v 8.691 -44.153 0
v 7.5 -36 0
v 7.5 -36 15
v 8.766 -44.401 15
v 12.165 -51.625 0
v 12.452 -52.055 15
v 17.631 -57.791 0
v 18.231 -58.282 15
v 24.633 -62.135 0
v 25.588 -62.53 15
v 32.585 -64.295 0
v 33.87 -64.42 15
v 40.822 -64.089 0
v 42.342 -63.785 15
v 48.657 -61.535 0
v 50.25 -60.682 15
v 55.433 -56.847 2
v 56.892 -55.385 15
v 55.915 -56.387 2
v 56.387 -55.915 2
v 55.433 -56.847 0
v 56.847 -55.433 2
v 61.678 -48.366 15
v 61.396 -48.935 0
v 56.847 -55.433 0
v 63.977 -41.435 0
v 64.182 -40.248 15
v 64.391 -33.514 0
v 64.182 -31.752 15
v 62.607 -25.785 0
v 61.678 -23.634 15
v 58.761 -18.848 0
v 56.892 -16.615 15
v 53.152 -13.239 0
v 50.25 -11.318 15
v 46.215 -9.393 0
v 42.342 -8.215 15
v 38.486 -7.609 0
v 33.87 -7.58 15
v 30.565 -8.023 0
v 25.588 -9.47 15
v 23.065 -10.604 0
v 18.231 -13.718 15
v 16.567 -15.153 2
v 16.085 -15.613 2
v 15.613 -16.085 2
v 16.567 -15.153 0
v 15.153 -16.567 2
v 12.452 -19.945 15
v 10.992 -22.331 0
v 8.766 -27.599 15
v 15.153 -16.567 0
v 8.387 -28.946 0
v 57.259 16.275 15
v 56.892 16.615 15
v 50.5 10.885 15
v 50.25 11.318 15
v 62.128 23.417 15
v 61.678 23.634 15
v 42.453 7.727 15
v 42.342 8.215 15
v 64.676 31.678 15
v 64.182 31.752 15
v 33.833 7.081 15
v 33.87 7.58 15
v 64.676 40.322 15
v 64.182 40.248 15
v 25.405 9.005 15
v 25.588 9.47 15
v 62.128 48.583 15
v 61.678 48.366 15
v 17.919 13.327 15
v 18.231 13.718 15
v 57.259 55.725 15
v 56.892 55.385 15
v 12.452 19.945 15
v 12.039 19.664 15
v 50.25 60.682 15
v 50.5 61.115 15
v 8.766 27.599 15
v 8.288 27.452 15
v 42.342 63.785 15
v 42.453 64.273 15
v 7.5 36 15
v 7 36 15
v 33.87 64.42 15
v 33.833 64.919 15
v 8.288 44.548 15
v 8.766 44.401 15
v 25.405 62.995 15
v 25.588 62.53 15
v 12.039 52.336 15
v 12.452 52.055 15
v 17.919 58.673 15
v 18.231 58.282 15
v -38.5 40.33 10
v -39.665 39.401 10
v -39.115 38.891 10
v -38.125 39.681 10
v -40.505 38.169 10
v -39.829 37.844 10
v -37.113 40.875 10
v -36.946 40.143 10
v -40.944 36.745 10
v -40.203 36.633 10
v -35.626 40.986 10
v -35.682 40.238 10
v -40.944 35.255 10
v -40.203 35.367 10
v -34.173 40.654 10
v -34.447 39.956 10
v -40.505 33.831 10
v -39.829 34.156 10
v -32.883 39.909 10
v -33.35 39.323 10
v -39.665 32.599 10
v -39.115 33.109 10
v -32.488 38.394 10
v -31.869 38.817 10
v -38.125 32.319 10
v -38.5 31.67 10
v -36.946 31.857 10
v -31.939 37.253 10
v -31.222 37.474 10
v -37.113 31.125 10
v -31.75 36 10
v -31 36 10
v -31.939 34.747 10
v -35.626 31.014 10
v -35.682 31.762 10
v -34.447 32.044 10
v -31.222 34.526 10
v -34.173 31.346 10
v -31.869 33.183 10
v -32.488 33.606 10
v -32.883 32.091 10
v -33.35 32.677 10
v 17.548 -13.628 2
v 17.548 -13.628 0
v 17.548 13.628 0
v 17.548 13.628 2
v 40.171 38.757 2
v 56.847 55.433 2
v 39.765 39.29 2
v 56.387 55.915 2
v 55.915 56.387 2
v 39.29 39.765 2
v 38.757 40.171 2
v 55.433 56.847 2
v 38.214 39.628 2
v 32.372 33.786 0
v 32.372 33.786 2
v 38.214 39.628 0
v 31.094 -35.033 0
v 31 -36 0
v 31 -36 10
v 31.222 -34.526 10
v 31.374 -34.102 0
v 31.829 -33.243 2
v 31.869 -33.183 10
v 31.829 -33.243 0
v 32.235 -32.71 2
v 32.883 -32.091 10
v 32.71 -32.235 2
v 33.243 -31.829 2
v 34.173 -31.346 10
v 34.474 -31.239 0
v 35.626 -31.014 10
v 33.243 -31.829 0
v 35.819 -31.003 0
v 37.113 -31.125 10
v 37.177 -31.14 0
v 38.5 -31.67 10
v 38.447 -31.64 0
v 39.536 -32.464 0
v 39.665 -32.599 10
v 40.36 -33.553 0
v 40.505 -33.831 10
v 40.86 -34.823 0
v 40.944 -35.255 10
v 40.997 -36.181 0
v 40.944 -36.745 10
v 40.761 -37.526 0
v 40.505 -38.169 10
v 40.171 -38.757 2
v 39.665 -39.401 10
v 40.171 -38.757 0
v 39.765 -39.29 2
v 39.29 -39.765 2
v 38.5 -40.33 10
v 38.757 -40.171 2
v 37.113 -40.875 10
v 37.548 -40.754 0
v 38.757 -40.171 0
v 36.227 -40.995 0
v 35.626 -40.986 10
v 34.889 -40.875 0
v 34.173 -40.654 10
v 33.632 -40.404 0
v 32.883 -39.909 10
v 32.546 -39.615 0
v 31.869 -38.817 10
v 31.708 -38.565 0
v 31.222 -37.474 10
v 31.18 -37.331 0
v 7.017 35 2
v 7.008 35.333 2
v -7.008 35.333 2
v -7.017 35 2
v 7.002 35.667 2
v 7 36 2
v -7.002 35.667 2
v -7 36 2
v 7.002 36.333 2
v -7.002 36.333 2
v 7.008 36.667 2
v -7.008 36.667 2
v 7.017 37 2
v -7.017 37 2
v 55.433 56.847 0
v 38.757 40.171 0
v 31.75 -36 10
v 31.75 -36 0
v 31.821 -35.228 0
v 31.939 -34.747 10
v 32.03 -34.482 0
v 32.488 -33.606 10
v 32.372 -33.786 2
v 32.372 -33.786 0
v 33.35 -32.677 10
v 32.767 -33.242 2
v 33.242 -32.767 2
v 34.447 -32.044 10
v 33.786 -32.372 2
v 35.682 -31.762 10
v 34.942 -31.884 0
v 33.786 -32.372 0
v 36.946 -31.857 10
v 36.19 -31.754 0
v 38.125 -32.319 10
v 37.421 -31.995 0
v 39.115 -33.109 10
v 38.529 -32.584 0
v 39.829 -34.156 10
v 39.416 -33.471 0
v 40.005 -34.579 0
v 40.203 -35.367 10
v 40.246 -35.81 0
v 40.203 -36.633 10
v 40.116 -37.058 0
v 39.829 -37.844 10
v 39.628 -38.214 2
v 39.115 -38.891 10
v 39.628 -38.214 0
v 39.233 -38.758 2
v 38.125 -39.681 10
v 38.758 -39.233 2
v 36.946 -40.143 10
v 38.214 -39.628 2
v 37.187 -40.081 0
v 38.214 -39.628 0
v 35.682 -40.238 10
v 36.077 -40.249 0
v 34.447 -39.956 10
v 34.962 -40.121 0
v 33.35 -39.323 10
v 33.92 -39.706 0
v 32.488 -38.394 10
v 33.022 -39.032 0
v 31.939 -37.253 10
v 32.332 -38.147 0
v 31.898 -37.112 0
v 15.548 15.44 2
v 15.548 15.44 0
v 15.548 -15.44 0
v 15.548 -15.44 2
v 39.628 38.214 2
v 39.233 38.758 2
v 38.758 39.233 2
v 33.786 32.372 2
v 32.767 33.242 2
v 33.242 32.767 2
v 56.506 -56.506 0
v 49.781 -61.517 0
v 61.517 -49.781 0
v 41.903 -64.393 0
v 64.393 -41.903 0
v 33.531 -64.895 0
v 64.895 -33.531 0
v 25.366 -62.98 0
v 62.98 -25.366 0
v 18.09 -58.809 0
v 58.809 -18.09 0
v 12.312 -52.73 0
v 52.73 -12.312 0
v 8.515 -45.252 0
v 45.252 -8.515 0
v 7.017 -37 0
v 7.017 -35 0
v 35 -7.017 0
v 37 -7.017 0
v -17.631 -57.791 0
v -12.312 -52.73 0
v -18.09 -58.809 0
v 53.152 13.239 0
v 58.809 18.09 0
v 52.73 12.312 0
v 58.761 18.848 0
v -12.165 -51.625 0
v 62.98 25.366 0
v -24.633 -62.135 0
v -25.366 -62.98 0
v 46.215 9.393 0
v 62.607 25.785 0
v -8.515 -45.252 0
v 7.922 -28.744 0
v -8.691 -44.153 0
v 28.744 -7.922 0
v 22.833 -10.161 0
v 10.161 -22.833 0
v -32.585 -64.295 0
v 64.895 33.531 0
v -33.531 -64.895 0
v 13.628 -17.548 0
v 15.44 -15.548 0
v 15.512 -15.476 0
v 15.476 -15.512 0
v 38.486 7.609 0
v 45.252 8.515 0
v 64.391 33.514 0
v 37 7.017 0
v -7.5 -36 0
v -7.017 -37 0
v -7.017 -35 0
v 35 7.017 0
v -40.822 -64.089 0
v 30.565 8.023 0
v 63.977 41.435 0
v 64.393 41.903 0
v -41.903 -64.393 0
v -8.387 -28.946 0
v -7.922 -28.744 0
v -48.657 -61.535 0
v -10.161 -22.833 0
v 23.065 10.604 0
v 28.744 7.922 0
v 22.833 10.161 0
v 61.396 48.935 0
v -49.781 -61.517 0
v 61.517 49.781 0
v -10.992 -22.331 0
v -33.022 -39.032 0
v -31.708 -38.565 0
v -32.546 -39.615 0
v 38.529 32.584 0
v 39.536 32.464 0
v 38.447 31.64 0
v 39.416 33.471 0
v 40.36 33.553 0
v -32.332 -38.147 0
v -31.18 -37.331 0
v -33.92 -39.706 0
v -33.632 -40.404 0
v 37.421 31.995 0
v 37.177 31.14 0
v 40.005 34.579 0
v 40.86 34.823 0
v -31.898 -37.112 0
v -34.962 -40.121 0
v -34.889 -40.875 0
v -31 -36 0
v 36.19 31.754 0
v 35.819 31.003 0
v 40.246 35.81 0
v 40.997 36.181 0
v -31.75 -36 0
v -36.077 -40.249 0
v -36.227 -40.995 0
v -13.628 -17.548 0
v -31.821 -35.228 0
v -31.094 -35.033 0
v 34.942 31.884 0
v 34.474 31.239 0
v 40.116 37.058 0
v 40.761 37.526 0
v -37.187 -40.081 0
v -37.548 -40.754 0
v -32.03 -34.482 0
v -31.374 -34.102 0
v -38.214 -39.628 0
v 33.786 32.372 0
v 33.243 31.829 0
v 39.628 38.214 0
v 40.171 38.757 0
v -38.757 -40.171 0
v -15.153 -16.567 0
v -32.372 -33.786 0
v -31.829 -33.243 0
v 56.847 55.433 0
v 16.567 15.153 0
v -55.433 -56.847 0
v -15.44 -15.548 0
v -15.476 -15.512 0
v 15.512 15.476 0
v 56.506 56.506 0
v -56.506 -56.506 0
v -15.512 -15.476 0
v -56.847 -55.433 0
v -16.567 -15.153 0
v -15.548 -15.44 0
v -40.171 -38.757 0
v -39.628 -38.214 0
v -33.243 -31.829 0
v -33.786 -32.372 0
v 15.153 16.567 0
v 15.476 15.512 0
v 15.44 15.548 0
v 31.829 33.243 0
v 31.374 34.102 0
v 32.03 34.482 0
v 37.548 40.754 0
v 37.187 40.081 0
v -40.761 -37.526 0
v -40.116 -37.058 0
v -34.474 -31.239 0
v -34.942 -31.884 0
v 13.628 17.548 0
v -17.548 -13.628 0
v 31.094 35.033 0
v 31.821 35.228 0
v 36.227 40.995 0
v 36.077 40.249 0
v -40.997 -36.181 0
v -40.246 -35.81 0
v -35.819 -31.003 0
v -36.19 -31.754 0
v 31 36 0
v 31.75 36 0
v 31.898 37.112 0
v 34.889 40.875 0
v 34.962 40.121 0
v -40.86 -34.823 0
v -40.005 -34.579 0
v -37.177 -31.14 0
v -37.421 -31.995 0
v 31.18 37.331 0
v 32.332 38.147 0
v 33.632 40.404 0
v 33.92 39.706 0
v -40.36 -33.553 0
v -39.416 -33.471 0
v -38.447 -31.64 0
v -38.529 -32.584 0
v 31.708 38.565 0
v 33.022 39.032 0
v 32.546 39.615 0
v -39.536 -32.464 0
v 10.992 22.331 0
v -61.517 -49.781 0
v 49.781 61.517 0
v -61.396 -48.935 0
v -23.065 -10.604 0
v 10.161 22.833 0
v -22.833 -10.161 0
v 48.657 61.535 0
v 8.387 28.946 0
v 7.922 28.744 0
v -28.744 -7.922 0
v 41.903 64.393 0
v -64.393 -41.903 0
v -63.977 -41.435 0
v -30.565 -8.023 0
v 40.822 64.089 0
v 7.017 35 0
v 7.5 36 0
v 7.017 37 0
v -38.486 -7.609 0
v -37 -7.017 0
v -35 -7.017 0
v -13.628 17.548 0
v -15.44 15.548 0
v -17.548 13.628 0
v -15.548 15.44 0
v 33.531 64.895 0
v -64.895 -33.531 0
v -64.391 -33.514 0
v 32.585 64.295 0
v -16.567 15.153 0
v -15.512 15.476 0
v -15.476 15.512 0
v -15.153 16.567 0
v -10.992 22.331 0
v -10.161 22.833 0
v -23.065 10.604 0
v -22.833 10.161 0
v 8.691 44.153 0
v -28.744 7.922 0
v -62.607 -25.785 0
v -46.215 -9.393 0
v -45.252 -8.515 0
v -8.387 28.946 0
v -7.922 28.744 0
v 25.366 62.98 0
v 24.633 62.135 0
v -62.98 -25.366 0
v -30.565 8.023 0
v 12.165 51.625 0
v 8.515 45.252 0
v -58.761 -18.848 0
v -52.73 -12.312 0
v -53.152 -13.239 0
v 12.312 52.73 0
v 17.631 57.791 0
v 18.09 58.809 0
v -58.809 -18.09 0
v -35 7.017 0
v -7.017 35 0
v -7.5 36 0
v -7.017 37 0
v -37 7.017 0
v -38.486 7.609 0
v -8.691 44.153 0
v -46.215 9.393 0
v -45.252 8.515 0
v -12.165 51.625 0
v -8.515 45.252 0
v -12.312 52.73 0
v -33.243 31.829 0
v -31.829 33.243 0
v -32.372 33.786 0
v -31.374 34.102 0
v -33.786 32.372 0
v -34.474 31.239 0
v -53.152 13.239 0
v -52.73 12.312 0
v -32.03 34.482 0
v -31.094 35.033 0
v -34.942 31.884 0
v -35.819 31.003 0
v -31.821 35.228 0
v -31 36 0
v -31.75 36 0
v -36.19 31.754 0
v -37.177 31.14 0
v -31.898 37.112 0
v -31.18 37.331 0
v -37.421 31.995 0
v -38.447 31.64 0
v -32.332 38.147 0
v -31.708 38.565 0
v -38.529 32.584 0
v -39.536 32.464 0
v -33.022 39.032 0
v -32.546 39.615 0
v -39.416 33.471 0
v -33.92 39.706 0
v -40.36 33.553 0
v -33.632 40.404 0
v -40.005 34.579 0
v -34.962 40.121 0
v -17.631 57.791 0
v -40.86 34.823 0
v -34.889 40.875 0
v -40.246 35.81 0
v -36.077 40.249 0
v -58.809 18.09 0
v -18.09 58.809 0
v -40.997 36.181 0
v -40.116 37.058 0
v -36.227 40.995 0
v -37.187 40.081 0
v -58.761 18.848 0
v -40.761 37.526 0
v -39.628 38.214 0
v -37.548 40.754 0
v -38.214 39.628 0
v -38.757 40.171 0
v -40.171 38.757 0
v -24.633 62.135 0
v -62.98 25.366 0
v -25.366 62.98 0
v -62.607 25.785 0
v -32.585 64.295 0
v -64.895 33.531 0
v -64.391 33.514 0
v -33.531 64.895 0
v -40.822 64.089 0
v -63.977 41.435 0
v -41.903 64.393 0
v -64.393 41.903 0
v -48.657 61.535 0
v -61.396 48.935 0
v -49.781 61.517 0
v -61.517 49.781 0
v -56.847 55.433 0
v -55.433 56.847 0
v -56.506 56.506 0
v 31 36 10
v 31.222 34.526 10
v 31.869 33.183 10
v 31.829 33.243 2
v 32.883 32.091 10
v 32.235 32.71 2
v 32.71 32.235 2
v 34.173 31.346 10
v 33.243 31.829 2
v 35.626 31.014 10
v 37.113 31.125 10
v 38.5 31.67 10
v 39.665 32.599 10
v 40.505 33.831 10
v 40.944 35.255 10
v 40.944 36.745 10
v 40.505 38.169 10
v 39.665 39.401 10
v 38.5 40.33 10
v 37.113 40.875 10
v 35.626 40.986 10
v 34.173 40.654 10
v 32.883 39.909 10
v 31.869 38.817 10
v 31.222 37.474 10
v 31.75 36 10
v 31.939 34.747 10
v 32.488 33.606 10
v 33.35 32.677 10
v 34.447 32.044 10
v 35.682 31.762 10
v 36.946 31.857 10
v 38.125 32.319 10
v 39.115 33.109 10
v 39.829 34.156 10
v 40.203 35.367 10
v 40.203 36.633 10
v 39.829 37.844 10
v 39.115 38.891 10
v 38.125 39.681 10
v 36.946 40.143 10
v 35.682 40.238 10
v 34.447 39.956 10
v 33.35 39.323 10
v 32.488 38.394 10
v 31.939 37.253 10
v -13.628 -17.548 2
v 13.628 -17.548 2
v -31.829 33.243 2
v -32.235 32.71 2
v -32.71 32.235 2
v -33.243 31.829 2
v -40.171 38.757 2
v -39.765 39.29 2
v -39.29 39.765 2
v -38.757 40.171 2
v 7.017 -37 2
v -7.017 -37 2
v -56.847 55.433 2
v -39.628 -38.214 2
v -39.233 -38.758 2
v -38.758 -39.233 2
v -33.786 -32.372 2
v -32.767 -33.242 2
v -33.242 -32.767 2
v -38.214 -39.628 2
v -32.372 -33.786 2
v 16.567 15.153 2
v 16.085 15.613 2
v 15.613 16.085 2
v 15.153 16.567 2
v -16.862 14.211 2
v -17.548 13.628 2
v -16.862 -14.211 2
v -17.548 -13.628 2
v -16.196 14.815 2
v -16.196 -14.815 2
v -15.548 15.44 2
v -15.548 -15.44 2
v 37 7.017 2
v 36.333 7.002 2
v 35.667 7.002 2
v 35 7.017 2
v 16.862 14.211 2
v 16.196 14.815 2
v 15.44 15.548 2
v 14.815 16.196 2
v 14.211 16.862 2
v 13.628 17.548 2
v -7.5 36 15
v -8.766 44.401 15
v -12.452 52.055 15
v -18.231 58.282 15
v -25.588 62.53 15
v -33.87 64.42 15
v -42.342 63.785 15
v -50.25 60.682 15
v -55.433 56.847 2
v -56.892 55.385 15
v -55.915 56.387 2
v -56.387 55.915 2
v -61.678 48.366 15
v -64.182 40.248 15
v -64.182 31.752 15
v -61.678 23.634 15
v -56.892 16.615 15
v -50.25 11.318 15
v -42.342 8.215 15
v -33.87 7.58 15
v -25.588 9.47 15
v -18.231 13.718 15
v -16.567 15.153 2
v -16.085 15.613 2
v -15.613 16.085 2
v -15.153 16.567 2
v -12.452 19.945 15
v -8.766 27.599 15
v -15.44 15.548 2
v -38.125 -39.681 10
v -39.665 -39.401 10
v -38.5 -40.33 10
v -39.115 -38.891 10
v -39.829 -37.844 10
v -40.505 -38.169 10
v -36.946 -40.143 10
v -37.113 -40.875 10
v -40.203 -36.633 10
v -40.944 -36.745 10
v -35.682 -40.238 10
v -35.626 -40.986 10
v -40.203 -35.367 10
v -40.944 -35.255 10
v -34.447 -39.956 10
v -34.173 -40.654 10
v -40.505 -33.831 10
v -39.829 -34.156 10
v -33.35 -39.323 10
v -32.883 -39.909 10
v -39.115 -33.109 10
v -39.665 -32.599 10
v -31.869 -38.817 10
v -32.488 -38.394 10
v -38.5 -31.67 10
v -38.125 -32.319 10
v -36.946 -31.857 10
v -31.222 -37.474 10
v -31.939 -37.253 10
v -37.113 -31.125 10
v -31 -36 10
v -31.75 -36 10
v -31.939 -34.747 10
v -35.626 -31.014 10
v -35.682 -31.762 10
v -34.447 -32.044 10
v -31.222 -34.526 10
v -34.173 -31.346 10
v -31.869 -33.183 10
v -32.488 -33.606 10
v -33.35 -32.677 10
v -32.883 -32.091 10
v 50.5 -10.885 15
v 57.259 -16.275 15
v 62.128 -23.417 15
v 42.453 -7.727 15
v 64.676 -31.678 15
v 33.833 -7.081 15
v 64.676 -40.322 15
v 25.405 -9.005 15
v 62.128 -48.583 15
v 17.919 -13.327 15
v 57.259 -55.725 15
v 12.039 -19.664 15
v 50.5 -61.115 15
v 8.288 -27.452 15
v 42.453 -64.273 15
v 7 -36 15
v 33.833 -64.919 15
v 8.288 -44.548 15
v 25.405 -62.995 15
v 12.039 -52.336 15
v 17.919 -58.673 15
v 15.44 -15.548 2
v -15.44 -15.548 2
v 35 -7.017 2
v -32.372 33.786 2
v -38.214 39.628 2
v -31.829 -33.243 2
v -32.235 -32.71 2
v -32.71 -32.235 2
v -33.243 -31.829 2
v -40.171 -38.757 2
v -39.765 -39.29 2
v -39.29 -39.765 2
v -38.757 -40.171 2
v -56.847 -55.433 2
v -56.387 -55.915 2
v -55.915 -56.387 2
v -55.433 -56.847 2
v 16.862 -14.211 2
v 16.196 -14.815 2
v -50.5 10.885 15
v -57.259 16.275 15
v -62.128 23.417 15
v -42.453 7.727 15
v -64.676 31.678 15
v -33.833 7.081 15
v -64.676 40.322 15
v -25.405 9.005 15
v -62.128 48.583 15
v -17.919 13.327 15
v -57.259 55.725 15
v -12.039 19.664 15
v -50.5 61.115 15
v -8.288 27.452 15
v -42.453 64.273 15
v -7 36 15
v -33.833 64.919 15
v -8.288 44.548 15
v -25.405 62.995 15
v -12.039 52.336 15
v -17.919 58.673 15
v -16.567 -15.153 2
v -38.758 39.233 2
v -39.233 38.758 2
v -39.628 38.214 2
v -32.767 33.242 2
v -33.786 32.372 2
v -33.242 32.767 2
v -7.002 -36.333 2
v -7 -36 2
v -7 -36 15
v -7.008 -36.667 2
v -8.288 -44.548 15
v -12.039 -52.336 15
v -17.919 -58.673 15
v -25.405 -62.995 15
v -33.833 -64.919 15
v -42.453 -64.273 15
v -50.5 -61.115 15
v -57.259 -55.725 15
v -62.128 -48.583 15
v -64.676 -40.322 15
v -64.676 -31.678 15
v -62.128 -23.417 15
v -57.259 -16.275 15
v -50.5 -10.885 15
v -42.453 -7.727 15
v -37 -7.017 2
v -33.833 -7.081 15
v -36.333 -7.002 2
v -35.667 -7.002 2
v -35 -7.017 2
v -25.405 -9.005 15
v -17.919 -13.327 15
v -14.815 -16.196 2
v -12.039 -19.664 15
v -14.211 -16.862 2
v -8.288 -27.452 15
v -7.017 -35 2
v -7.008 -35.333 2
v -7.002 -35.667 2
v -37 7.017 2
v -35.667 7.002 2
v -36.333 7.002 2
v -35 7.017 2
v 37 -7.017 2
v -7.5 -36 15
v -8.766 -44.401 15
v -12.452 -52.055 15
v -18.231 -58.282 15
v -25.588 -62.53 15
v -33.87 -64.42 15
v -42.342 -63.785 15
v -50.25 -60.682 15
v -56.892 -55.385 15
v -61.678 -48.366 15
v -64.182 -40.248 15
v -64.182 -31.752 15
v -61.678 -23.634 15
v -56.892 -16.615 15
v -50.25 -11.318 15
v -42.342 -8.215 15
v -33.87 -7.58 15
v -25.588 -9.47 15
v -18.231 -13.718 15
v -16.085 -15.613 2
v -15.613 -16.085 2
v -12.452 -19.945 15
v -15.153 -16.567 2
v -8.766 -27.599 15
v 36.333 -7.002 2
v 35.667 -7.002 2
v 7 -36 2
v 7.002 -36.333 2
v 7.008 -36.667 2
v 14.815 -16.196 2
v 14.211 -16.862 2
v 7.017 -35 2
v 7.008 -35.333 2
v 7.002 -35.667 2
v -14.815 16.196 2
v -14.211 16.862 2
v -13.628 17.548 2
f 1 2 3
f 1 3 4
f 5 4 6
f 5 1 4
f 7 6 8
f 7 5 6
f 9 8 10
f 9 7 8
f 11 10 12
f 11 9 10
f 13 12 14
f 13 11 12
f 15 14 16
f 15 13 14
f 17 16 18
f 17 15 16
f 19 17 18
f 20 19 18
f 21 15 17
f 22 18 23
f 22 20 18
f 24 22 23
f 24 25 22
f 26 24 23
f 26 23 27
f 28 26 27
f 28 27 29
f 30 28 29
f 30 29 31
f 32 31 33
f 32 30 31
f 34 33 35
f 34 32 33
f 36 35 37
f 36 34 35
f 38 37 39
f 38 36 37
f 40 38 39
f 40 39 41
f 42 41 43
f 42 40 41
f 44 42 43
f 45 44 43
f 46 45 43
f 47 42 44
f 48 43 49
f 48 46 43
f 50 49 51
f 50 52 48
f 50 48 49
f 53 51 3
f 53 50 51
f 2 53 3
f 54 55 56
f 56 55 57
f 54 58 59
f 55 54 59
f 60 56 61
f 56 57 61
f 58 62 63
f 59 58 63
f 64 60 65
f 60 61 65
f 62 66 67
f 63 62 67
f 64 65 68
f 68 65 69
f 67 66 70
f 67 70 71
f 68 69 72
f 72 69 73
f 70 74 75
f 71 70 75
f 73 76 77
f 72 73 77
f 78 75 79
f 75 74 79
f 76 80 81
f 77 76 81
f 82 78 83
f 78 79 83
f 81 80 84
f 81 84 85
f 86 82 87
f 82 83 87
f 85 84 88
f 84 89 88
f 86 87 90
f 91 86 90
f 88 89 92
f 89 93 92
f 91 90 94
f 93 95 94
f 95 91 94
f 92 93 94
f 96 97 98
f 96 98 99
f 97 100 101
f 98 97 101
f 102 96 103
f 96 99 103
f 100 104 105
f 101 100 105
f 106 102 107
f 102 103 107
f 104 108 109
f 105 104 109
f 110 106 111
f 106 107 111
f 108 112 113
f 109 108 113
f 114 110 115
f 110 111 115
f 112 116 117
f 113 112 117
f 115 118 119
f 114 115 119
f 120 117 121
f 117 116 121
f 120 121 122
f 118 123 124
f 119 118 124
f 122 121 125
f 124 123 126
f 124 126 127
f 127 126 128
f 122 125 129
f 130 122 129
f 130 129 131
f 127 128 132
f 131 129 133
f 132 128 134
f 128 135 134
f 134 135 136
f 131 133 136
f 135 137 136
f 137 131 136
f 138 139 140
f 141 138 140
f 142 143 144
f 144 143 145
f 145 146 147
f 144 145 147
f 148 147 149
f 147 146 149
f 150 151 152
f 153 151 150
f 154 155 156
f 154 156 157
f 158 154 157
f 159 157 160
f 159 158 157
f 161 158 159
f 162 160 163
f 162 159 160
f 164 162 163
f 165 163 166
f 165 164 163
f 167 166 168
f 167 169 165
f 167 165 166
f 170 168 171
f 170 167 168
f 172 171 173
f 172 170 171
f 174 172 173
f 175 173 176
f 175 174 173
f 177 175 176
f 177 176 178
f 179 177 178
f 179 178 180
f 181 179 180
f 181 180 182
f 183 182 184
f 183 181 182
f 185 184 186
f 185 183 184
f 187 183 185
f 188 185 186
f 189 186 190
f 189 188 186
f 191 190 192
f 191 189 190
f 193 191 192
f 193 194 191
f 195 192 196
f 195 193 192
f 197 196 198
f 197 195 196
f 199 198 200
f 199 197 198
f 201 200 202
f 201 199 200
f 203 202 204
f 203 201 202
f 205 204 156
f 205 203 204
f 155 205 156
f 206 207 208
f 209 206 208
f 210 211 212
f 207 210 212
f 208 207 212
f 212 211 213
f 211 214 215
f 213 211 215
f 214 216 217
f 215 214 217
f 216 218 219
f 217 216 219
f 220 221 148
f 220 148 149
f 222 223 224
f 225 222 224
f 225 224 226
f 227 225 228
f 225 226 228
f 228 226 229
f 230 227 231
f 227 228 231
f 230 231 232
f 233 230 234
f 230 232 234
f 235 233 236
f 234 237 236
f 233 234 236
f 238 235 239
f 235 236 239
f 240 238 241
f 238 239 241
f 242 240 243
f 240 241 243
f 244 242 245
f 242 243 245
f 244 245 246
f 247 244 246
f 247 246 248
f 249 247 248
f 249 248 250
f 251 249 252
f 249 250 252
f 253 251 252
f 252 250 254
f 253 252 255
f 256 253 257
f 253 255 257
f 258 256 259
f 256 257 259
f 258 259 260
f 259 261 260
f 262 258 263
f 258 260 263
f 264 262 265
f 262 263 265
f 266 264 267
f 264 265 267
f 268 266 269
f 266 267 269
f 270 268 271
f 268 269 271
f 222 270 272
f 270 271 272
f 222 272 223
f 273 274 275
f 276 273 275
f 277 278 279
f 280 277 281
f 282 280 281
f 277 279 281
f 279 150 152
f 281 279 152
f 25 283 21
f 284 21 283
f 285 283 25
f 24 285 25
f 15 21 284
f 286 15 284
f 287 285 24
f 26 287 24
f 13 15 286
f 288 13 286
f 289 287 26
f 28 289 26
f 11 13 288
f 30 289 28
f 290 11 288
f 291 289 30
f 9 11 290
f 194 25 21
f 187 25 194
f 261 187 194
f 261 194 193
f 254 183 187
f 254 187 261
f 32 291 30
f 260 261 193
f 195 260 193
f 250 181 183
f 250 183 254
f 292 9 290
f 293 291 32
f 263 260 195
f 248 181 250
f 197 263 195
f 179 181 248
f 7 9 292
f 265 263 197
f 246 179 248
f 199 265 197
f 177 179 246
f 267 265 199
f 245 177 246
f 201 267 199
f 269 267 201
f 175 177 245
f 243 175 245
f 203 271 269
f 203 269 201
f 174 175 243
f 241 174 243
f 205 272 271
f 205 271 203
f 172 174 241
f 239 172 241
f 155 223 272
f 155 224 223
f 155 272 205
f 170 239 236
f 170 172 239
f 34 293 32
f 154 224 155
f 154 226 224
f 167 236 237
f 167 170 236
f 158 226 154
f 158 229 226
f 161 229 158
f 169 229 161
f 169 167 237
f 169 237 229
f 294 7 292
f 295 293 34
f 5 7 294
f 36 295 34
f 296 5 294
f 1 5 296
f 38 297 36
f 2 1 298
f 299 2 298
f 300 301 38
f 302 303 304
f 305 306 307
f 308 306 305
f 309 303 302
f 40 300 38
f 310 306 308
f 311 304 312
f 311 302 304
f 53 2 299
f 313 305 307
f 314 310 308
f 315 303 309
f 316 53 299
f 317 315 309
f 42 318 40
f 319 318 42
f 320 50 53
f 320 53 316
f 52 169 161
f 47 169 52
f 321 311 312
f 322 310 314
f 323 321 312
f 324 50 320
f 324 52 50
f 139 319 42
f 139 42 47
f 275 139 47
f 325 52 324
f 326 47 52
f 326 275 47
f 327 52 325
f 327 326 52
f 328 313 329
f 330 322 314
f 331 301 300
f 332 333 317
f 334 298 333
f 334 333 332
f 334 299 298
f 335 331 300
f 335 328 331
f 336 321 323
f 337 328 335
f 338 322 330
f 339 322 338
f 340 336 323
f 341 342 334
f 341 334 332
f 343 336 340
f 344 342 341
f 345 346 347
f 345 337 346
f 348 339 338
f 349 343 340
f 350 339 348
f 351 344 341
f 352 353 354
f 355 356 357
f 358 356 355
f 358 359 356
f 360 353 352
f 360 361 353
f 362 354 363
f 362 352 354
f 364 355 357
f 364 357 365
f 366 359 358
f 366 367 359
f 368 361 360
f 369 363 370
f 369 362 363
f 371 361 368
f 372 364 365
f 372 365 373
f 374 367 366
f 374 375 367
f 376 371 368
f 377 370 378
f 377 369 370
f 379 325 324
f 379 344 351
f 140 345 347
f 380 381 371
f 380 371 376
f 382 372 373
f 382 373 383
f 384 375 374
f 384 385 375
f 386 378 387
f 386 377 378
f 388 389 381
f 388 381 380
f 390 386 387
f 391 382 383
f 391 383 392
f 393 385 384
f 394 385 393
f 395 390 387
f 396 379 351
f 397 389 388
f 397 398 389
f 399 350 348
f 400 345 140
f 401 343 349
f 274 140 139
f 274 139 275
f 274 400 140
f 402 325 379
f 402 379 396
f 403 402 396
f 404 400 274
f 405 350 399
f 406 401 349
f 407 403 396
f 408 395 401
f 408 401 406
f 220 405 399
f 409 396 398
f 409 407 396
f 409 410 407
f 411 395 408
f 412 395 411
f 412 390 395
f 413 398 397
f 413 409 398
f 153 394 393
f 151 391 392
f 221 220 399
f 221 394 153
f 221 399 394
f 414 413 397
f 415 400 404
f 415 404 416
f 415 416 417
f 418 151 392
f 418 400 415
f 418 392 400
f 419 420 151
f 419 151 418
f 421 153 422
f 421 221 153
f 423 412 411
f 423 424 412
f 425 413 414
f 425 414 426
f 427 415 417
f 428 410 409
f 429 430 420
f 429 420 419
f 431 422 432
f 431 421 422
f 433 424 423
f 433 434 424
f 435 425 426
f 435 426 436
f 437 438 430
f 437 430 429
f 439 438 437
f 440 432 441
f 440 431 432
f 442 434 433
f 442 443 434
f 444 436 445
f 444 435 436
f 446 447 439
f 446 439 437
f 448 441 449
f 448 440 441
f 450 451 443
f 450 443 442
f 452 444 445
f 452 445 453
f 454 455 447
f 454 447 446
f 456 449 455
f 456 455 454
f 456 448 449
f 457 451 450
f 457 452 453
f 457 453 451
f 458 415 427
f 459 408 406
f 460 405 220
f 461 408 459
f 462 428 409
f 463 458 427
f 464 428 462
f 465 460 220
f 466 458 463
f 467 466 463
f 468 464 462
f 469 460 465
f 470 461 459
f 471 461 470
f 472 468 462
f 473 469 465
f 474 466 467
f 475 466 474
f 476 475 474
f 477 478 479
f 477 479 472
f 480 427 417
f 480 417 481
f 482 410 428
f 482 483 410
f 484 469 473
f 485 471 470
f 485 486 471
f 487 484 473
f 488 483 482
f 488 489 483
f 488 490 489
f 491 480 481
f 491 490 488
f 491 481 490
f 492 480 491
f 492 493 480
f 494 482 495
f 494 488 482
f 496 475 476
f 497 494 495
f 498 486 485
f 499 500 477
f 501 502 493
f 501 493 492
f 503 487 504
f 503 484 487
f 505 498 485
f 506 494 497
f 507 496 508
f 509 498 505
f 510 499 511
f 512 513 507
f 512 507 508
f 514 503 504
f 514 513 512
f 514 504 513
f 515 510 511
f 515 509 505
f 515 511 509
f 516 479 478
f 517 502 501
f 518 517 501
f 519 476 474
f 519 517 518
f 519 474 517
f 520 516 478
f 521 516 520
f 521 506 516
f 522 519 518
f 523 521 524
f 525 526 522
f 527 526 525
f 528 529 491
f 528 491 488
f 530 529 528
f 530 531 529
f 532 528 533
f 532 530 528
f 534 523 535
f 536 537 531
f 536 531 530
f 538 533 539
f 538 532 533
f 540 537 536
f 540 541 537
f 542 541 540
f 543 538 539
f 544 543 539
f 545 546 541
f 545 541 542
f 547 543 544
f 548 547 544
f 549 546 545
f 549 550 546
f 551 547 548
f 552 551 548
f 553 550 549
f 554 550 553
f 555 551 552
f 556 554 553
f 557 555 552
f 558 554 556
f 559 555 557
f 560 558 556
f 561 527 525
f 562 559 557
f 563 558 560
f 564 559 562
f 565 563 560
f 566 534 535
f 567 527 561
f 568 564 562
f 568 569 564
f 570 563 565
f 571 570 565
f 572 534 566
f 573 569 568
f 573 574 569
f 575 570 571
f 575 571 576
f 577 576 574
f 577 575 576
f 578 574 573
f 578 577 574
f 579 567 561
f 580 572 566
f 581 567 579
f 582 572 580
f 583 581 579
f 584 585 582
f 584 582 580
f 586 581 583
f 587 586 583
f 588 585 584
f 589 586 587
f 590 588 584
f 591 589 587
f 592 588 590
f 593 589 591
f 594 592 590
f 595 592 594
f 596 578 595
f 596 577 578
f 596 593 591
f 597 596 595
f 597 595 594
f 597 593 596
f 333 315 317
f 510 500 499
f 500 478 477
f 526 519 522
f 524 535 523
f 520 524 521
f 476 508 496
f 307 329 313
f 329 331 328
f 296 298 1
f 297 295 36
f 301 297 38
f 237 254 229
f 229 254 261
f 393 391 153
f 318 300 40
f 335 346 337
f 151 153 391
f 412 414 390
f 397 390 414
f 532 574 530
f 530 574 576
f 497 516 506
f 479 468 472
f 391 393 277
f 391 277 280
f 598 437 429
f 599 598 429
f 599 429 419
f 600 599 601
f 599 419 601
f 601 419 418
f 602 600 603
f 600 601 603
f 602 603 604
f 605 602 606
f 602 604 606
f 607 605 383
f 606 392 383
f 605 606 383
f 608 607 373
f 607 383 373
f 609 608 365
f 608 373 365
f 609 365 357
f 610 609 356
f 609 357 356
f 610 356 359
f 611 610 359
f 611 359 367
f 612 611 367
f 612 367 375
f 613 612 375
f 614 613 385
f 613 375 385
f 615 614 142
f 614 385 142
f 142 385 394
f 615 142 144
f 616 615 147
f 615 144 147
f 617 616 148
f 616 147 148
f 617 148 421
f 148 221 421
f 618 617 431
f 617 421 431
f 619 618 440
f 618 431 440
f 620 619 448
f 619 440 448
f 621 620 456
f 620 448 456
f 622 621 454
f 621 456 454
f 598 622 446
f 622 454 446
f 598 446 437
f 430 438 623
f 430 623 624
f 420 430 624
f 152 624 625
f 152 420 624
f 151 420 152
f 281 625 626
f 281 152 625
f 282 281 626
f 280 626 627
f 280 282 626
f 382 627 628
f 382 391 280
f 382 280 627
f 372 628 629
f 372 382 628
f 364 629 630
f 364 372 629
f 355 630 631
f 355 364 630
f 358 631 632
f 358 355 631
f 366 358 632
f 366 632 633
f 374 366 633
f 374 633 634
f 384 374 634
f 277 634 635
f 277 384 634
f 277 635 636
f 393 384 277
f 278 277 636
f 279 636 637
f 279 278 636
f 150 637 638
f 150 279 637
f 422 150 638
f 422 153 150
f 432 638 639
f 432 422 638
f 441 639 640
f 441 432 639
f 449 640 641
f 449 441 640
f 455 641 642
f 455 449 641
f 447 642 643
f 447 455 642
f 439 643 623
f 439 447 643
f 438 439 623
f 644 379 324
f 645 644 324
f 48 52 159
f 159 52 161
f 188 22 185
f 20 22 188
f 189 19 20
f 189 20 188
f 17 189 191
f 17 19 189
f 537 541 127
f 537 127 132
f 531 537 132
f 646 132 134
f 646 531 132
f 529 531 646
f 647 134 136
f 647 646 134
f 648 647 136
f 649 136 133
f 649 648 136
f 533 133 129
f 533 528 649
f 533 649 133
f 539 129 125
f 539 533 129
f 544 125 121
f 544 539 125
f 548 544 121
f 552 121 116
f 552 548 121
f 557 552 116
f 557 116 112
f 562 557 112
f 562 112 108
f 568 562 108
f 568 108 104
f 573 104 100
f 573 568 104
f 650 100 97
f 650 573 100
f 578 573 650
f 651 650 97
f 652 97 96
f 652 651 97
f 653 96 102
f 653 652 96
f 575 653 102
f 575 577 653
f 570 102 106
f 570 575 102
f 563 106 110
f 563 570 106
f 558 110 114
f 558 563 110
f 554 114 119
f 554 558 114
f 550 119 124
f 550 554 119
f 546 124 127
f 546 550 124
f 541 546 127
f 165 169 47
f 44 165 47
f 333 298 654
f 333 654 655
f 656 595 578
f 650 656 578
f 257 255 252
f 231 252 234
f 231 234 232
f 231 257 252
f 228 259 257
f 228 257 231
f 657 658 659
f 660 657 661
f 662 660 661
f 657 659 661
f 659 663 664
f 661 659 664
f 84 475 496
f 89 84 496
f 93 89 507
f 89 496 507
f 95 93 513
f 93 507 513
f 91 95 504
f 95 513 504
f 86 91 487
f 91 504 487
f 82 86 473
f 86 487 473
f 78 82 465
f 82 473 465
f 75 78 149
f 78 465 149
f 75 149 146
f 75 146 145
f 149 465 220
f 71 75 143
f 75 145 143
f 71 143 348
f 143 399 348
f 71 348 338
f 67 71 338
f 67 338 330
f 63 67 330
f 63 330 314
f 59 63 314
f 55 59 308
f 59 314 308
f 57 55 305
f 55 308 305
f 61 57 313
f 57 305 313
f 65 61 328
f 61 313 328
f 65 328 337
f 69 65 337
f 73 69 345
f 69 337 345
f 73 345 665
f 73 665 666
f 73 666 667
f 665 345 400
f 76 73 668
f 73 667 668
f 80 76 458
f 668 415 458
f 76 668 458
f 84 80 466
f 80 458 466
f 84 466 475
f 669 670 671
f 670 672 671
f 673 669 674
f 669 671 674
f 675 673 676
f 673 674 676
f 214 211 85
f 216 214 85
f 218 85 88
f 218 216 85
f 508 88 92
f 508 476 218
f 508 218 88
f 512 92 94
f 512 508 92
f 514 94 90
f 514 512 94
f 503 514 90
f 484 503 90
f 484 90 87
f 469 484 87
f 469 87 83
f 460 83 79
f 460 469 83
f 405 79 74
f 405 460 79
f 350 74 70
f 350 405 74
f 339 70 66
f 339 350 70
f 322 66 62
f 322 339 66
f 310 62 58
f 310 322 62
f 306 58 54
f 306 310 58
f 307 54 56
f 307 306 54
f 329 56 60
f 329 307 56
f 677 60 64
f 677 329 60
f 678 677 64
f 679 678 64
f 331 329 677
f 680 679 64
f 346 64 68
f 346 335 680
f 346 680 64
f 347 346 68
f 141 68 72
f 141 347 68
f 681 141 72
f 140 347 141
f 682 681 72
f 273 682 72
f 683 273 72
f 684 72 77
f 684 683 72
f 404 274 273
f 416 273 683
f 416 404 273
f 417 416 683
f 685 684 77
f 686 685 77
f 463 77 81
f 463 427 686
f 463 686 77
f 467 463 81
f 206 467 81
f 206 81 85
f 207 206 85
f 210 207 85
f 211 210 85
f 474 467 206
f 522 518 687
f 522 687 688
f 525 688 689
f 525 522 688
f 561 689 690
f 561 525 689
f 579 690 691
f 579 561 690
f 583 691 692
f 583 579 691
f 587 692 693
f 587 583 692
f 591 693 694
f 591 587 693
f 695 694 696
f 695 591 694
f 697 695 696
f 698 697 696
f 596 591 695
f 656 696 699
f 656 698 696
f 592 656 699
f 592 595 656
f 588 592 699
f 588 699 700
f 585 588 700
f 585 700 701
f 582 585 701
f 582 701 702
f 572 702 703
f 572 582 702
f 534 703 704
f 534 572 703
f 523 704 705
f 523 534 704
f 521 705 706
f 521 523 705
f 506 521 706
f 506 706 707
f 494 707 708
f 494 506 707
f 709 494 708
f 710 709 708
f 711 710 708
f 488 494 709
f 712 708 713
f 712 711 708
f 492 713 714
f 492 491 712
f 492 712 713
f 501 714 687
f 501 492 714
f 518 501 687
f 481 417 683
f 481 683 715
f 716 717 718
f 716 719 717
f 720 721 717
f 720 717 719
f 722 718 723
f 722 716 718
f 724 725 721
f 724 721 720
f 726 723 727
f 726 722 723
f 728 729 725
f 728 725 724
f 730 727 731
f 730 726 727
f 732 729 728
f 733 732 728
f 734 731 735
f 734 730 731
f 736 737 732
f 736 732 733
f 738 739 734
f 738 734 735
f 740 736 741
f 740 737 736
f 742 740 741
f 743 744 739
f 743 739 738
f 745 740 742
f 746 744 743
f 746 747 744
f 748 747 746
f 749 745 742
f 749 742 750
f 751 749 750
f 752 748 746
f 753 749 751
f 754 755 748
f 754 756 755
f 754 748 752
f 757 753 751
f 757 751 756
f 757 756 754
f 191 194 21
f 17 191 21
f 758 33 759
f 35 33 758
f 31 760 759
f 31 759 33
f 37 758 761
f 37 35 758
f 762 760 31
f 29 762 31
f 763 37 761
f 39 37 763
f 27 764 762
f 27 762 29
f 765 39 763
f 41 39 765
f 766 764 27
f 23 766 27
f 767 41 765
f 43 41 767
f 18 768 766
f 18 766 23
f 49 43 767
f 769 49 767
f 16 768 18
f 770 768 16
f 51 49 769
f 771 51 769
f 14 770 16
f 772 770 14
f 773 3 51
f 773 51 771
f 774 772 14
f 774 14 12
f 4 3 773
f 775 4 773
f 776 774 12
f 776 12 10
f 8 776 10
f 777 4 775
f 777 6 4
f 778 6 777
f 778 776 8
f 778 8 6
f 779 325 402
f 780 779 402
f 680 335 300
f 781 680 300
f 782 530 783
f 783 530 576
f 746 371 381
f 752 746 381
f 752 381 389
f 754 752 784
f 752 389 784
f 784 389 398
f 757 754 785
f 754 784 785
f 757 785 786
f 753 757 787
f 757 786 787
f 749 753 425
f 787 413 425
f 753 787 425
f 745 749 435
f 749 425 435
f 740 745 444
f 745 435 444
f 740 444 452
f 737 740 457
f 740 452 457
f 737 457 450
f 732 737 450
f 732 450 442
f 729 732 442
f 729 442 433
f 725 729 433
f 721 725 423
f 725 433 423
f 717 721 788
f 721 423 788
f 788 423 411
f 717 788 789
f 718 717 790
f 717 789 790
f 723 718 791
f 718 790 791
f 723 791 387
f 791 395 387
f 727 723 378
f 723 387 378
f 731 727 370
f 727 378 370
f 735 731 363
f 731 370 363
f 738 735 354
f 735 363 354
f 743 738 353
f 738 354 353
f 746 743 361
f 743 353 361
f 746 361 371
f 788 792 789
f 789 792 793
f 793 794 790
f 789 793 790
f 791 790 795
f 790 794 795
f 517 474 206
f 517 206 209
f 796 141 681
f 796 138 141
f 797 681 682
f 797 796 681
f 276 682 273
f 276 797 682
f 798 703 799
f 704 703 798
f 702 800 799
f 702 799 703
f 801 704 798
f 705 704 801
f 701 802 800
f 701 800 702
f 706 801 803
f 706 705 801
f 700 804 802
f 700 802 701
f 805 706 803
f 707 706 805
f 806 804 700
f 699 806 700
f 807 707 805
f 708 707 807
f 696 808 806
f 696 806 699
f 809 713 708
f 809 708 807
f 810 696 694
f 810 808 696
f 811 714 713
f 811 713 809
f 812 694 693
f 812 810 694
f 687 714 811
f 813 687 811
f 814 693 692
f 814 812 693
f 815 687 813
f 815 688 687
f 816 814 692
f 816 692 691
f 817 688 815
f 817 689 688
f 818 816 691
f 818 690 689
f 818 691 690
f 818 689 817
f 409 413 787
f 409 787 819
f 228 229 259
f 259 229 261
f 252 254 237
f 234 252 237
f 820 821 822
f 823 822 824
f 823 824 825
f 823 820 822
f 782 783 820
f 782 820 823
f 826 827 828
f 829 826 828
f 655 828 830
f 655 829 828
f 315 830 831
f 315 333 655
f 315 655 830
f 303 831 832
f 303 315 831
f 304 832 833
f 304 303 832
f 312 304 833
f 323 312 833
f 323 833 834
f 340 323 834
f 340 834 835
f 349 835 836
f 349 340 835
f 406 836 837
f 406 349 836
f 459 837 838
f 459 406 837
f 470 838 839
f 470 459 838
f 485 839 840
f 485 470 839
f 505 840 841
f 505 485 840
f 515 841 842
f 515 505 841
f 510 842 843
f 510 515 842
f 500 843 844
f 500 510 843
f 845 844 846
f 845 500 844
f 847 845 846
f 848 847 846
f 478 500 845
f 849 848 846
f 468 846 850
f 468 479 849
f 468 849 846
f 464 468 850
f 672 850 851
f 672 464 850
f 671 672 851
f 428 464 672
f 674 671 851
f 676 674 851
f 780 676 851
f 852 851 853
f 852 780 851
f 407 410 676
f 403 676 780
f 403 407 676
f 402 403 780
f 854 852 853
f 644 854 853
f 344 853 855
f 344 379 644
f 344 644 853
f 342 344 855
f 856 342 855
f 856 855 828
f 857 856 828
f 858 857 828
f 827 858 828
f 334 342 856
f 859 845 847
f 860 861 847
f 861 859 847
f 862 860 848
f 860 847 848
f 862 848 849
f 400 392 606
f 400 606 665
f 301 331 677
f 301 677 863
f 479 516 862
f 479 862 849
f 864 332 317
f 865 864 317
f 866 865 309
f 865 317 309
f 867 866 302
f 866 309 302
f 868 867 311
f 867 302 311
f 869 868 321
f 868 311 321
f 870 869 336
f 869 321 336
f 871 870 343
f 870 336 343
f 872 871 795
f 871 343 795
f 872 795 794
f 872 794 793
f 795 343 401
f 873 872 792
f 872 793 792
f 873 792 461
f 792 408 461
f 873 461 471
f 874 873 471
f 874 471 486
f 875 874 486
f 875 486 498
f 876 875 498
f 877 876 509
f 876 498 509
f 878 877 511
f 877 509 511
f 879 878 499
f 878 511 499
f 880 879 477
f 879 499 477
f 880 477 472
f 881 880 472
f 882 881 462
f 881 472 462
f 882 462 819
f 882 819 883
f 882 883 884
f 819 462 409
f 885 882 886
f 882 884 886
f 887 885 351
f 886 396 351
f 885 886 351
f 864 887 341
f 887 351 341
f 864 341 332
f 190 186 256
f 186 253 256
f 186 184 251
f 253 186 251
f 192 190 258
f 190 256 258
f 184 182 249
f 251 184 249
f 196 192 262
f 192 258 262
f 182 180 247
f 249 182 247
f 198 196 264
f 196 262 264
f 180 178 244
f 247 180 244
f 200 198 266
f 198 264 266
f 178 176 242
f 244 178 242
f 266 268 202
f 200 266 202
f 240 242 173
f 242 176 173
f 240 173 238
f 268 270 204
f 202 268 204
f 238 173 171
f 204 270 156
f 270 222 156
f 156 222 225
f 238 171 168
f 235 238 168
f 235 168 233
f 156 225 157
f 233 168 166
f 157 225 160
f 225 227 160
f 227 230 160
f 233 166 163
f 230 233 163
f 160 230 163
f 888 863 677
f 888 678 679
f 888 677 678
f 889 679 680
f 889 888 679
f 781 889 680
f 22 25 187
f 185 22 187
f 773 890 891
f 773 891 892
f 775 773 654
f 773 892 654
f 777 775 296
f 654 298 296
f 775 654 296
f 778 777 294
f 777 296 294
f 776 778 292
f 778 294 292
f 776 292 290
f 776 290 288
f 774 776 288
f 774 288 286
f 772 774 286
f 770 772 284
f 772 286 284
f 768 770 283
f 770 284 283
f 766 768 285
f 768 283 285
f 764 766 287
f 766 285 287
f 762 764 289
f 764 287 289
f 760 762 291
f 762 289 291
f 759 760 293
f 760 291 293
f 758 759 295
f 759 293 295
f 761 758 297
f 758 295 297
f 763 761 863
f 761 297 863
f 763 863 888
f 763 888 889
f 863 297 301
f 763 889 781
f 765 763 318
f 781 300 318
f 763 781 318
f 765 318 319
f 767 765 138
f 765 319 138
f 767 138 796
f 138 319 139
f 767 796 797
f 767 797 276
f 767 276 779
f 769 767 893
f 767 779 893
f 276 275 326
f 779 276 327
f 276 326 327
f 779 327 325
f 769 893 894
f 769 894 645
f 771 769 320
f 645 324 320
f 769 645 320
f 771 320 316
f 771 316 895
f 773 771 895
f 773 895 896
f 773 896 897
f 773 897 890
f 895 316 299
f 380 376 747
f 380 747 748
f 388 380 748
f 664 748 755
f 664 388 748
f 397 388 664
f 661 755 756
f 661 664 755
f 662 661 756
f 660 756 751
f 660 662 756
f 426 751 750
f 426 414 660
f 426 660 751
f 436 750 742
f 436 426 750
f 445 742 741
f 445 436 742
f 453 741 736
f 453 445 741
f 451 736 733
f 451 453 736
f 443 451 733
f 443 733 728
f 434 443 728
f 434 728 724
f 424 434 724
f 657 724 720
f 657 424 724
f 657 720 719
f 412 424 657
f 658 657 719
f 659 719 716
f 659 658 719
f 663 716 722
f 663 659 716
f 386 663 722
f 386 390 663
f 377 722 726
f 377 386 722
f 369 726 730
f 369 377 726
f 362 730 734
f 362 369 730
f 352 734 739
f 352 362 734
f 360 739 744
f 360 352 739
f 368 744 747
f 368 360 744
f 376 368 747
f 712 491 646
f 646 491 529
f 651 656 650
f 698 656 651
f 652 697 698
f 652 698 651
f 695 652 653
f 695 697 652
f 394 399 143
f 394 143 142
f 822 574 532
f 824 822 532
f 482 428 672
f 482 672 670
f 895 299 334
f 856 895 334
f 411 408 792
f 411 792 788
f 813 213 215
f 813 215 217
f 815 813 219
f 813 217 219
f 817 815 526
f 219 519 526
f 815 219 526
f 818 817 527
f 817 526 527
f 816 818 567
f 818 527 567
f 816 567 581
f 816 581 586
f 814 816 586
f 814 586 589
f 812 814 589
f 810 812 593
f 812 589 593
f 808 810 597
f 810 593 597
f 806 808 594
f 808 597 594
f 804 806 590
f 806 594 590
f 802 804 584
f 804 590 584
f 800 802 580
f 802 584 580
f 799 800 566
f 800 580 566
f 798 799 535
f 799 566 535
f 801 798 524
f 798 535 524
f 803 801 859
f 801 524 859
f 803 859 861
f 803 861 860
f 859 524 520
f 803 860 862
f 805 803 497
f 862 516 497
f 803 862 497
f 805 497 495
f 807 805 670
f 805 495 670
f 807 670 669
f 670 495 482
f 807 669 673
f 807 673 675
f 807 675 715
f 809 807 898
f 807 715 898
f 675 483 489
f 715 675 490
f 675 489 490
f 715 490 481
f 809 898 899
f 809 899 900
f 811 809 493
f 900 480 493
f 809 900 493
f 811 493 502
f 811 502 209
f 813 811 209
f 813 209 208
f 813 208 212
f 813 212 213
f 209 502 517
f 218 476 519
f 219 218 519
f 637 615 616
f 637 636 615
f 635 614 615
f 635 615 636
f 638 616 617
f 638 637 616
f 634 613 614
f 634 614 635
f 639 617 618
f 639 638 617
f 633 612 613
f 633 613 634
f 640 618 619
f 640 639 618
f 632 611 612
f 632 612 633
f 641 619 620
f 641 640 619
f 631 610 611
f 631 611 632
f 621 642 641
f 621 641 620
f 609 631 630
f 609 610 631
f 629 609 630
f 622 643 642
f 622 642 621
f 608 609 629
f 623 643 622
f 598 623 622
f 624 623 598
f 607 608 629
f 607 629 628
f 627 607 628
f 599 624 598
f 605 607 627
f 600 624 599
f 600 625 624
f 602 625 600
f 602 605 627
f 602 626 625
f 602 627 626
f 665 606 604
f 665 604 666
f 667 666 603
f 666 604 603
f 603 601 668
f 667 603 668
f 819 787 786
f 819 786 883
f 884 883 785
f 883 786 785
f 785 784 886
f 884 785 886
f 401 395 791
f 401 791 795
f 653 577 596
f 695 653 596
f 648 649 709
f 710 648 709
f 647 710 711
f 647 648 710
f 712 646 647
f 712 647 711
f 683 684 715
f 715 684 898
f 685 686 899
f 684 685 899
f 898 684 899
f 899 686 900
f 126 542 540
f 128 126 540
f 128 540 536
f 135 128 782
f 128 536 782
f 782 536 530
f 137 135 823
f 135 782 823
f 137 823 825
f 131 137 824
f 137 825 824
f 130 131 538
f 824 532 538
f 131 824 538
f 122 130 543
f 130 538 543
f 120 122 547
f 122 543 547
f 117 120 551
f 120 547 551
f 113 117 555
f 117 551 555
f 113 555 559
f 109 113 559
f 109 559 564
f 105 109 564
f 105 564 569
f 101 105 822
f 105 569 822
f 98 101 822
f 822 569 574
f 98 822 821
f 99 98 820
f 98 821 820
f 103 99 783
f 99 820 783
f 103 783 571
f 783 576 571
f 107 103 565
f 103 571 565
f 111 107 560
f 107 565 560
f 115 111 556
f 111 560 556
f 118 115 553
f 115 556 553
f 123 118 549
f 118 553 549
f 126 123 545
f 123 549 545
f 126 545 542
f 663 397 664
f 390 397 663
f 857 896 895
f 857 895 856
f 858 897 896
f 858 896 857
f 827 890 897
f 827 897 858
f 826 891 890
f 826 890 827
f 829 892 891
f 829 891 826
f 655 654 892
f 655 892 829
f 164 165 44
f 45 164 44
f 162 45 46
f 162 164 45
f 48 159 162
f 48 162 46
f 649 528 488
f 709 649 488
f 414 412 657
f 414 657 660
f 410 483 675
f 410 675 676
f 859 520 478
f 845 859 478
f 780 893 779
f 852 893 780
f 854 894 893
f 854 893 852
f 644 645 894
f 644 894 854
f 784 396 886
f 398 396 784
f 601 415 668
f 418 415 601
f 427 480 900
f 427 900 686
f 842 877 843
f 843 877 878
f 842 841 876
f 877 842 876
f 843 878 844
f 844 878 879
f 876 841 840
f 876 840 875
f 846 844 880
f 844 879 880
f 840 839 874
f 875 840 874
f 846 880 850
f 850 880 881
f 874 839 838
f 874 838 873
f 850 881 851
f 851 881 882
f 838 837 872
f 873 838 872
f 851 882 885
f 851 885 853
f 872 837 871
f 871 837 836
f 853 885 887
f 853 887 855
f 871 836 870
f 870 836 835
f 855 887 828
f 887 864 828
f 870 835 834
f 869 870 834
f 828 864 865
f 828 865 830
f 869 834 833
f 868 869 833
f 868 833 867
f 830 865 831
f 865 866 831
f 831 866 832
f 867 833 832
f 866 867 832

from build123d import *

# Parameters (mm, degrees)
F1_R     = 29
F1_R_2   = 28.5
F2_DEPTH = 15
F3_W     = 7.017247
F3_H     = 1
F3_W_2   = 2
F3_H_2   = 7.017247
F4_DEPTH = 2
F5_R     = 5
F5_R_2   = 4.25
F6_DEPTH = 10


with BuildPart() as f2:
    # F1 (on Top) → F2 (new body)
    with BuildSketch(Plane.XY):
        with Locations((-36, 36)):
            Circle(F1_R)
        with Locations((-36, 36)):
            Circle(F1_R_2, mode=Mode.SUBTRACT)
    extrude(amount=F2_DEPTH)

    # F3 (on Top) → F4 (join)
    with BuildSketch(Plane.XY):
        Polygon((-16.377787, 14.963573), (-15.67068, 15.67068), (-36, 36), (-34.585786, 36), (-35.292893, 36.707107), (-55.622213, 57.036427), (-57.036427, 55.622213), (-36.707107, 35.292893), align=None)
        Polygon((-36, 36), (-15.67068, 15.67068), (-14.963573, 16.377787), (-34.585786, 36), align=None)
        with Locations((-3.508623, 36.5)):
            Rectangle(F3_W, F3_H)
        with Locations((-3.508623, 35.5)):
            Rectangle(F3_W, F3_H)
        with Locations((-36, 3.508623)):
            Rectangle(F3_W_2, F3_H_2)
        Polygon((-17.547779, 13.627795), (-17.547779, 0), (-15.547779, 0), (-15.547779, 15.440169), align=None)
        Polygon((0, 15.547779), (0, 17.547779), (-13.627795, 17.547779), (-15.440169, 15.547779), align=None)
    extrude(amount=F4_DEPTH)

    # F5 (on face) → F6 (join)
    with BuildSketch(Plane(origin=(0, 0, 0), x_dir=(1, 0, 0), z_dir=(0, 0, -1))):
        with Locations((-36, -36)):
            Circle(F5_R)
        with Locations((-36, -36)):
            Circle(F5_R_2, mode=Mode.SUBTRACT)
    extrude(amount=-F6_DEPTH)

    # F8: F2 across plane


with BuildPart() as f2_1:
    add(f2.part)
    add(f2.part.mirror(Plane.XZ))

    # F9: F2 across plane


with BuildPart() as f2_2:
    add(f2_1.part)
    add(f2_1.part.mirror(Plane.YZ))


solid = f2_2.part
